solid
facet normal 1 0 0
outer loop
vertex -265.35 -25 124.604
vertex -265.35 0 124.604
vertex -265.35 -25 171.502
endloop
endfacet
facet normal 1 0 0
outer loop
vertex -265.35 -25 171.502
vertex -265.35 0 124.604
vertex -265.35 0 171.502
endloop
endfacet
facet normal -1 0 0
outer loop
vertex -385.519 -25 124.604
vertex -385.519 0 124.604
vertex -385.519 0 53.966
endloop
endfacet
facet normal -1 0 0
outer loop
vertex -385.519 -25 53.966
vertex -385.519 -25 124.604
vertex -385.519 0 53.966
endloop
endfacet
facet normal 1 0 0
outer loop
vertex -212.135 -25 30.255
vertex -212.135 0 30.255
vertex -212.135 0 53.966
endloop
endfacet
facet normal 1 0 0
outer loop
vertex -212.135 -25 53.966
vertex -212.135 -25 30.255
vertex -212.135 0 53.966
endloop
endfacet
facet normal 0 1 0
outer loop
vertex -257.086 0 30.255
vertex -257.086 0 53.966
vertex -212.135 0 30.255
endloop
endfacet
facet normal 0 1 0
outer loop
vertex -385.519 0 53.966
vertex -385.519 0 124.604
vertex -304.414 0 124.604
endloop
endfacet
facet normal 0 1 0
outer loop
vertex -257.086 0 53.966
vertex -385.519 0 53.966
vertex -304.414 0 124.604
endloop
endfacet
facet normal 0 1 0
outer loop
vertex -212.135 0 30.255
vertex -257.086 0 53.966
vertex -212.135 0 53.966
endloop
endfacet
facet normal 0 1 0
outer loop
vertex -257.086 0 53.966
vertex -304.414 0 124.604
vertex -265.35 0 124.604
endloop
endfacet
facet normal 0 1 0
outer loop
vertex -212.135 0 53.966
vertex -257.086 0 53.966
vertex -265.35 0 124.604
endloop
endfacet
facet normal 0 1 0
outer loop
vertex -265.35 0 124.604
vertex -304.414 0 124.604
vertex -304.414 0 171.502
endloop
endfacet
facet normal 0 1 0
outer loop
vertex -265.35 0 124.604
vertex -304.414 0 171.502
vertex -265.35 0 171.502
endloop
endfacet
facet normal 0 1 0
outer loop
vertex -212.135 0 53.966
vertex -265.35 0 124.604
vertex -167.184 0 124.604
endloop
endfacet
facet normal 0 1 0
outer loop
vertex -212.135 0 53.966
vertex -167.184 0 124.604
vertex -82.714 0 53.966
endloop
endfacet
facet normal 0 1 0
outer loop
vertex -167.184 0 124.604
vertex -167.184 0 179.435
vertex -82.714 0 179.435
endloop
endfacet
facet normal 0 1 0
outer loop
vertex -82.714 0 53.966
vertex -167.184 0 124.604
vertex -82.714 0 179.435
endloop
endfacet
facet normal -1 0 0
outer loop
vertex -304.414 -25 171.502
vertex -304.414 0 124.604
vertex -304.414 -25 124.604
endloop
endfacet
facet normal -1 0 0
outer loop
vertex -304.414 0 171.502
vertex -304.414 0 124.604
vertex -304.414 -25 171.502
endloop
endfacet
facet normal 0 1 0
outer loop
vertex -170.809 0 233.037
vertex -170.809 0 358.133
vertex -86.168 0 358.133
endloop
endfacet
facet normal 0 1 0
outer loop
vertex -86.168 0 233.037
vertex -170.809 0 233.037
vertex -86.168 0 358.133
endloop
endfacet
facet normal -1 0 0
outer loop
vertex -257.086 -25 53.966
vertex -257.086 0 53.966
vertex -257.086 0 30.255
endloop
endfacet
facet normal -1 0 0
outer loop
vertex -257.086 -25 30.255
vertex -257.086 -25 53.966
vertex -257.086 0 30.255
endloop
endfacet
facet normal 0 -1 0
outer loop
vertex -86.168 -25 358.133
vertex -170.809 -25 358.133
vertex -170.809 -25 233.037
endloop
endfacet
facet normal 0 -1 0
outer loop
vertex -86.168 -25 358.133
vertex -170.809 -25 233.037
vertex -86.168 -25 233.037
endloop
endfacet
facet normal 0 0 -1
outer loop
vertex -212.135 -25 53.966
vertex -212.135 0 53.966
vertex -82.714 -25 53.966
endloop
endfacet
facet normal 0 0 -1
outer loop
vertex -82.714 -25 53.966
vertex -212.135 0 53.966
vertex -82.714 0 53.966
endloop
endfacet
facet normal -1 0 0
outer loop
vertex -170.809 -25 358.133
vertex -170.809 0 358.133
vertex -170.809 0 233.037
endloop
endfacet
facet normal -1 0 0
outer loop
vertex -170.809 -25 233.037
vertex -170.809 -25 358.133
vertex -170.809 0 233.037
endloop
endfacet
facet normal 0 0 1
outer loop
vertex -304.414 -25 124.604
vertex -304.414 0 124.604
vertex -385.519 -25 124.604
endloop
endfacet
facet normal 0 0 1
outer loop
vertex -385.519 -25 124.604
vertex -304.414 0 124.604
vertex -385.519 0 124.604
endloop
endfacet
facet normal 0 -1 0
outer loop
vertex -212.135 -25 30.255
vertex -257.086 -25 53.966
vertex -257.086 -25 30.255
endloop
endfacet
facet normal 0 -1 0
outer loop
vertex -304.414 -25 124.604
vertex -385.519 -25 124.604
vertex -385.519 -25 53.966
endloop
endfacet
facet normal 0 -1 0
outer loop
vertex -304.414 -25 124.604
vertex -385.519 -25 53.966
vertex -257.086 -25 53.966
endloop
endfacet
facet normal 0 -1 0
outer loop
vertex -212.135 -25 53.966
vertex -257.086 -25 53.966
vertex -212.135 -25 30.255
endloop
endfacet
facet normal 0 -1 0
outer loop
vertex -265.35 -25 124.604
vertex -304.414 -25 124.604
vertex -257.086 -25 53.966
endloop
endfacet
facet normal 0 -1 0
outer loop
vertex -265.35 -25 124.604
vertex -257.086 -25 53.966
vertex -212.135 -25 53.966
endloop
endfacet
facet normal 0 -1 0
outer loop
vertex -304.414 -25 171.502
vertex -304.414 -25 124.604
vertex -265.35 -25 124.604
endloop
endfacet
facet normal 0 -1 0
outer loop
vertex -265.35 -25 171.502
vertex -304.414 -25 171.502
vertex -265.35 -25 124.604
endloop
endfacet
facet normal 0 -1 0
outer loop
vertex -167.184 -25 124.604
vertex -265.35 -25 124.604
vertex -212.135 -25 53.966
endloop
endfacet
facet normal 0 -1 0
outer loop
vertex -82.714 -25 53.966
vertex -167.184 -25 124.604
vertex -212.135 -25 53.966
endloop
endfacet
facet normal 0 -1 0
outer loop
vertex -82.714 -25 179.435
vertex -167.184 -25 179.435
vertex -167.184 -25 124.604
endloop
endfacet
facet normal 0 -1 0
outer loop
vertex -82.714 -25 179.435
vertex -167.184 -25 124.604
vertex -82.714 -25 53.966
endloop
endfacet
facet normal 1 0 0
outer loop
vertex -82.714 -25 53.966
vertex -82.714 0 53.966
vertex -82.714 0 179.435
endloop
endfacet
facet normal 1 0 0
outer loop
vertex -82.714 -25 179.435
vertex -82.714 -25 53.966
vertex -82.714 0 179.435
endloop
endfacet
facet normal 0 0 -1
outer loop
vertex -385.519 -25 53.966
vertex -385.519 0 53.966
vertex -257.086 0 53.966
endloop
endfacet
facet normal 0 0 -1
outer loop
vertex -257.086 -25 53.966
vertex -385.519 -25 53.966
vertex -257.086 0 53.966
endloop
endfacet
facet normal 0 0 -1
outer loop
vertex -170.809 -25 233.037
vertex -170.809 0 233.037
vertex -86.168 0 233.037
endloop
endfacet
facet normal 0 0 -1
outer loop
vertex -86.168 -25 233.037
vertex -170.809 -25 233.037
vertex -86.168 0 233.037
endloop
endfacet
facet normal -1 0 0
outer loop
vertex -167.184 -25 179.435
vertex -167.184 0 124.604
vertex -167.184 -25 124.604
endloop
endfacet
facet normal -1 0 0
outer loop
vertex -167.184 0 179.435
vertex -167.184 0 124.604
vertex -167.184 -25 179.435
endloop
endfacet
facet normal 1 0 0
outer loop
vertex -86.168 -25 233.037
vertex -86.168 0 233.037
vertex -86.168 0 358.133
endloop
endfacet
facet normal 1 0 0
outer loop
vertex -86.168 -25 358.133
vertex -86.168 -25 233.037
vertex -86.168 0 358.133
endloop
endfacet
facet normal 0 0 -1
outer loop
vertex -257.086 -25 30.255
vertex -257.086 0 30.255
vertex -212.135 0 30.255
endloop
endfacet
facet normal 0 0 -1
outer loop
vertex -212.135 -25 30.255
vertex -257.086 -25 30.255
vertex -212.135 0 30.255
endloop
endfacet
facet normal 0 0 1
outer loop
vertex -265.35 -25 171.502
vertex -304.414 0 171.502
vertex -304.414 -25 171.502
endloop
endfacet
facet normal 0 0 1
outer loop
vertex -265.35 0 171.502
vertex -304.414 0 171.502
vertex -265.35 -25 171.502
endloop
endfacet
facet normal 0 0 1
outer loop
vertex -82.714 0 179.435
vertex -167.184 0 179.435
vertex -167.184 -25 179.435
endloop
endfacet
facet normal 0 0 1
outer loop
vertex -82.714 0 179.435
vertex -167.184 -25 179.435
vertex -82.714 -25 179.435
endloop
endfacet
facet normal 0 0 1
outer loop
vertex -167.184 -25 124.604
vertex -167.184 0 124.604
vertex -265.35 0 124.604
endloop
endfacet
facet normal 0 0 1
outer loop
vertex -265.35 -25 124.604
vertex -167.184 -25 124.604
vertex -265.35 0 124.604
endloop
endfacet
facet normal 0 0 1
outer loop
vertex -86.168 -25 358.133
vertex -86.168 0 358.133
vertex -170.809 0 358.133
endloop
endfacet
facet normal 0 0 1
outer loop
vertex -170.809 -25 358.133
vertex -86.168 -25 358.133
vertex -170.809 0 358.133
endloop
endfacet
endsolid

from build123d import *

# Parameters (mm, degrees)
F0_W     = 84.4691768289
F0_H     = 54.8308715224
F0_W_2   = 42.2345884144
F0_H_2   = 52.3610152304
F0_W_3   = 39.0644073486
F0_H_3   = 46.8980446458
F0_W_4   = 44.9514240026
F0_W_5   = 37.0478928089
F0_H_4   = 22.2287364304
F0_W_6   = 27.1684527397
F1_DEPTH = 25
F0_W_7   = 42.320843786
F0_H_5   = 53.4489154816
F0_H_6   = 53.5979270935


with BuildPart() as f1:
    # F0 (on Front) → F1 (new body)
    with BuildSketch(Plane.XZ):
        with Locations((-124.9489299953, 152.0193703473)):
            Rectangle(F0_W, F0_H)
        Polygon((-82.7143415809, 106.326982379), (-82.7143415809, 124.603934586), (-167.1835184097, 124.603934586), (-265.3497457504, 124.603934586), (-304.4141530991, 124.603934586), (-321.3027119637, 124.603934586), (-321.3027119637, 76.1947035789), (-284.2548191547, 76.1947035789), (-257.086366415, 76.1947035789), (-257.086366415, 106.326982379), (-212.1349424124, 106.326982379), (-167.1835184097, 106.326982379), (-124.9489299953, 106.326982379), align=None)
        with Locations((-103.8316357881, 80.1464747638)):
            Rectangle(F0_W_2, F0_H_2)
        with Locations((-284.8819494247, 148.0529569089)):
            Rectangle(F0_W_3, F0_H_3)
        with Locations((-146.0662242025, 80.1464747638)):
            Rectangle(F0_W_2, F0_H_2)
        with Locations((-189.6592304111, 80.1464747638)):
            Rectangle(F0_W_4, F0_H_2)
        Polygon((-321.3027119637, 76.1947035789), (-321.3027119637, 124.603934586), (-385.5190575123, 124.603934586), (-385.5190575123, 53.9659671485), (-321.3027119637, 53.9659671485), align=None)
        Polygon((-212.1349424124, 53.9659671485), (-212.1349424124, 106.326982379), (-257.086366415, 106.326982379), (-257.086366415, 76.1947035789), (-257.086366415, 53.9659671485), (-257.086366415, 30.2553251386), (-212.1349424124, 30.2553251386), align=None)
        with Locations((-302.7787655592, 65.0803353637)):
            Rectangle(F0_W_5, F0_H_4)
        with Locations((-270.6705927849, 65.0803353637)):
            Rectangle(F0_W_6, F0_H_4)
    extrude(amount=F1_DEPTH)


with BuildPart() as f1b:
    # F0 (on Front) → F1, piece 2 (new body)
    with BuildSketch(Plane.XZ):
        with Locations((-149.6489662677, 331.4084708691)):
            Rectangle(F0_W_7, F0_H_5)
        with Locations((-107.3281224817, 331.4084708691)):
            Rectangle(F0_W_7, F0_H_5)
        Polygon((-128.4885443747, 304.6840131283), (-170.8093881607, 304.6840131283), (-170.8093881607, 286.6353988647), (-128.4885443747, 286.6353988647), (-86.1677005887, 286.6353988647), (-86.1677005887, 304.6840131283), align=None)
        with Locations((-149.6489662677, 259.836435318)):
            Rectangle(F0_W_7, F0_H_6)
        with Locations((-107.3281224817, 259.836435318)):
            Rectangle(F0_W_7, F0_H_6)
    extrude(amount=F1_DEPTH)


solid = Compound([f1.part, f1b.part])
